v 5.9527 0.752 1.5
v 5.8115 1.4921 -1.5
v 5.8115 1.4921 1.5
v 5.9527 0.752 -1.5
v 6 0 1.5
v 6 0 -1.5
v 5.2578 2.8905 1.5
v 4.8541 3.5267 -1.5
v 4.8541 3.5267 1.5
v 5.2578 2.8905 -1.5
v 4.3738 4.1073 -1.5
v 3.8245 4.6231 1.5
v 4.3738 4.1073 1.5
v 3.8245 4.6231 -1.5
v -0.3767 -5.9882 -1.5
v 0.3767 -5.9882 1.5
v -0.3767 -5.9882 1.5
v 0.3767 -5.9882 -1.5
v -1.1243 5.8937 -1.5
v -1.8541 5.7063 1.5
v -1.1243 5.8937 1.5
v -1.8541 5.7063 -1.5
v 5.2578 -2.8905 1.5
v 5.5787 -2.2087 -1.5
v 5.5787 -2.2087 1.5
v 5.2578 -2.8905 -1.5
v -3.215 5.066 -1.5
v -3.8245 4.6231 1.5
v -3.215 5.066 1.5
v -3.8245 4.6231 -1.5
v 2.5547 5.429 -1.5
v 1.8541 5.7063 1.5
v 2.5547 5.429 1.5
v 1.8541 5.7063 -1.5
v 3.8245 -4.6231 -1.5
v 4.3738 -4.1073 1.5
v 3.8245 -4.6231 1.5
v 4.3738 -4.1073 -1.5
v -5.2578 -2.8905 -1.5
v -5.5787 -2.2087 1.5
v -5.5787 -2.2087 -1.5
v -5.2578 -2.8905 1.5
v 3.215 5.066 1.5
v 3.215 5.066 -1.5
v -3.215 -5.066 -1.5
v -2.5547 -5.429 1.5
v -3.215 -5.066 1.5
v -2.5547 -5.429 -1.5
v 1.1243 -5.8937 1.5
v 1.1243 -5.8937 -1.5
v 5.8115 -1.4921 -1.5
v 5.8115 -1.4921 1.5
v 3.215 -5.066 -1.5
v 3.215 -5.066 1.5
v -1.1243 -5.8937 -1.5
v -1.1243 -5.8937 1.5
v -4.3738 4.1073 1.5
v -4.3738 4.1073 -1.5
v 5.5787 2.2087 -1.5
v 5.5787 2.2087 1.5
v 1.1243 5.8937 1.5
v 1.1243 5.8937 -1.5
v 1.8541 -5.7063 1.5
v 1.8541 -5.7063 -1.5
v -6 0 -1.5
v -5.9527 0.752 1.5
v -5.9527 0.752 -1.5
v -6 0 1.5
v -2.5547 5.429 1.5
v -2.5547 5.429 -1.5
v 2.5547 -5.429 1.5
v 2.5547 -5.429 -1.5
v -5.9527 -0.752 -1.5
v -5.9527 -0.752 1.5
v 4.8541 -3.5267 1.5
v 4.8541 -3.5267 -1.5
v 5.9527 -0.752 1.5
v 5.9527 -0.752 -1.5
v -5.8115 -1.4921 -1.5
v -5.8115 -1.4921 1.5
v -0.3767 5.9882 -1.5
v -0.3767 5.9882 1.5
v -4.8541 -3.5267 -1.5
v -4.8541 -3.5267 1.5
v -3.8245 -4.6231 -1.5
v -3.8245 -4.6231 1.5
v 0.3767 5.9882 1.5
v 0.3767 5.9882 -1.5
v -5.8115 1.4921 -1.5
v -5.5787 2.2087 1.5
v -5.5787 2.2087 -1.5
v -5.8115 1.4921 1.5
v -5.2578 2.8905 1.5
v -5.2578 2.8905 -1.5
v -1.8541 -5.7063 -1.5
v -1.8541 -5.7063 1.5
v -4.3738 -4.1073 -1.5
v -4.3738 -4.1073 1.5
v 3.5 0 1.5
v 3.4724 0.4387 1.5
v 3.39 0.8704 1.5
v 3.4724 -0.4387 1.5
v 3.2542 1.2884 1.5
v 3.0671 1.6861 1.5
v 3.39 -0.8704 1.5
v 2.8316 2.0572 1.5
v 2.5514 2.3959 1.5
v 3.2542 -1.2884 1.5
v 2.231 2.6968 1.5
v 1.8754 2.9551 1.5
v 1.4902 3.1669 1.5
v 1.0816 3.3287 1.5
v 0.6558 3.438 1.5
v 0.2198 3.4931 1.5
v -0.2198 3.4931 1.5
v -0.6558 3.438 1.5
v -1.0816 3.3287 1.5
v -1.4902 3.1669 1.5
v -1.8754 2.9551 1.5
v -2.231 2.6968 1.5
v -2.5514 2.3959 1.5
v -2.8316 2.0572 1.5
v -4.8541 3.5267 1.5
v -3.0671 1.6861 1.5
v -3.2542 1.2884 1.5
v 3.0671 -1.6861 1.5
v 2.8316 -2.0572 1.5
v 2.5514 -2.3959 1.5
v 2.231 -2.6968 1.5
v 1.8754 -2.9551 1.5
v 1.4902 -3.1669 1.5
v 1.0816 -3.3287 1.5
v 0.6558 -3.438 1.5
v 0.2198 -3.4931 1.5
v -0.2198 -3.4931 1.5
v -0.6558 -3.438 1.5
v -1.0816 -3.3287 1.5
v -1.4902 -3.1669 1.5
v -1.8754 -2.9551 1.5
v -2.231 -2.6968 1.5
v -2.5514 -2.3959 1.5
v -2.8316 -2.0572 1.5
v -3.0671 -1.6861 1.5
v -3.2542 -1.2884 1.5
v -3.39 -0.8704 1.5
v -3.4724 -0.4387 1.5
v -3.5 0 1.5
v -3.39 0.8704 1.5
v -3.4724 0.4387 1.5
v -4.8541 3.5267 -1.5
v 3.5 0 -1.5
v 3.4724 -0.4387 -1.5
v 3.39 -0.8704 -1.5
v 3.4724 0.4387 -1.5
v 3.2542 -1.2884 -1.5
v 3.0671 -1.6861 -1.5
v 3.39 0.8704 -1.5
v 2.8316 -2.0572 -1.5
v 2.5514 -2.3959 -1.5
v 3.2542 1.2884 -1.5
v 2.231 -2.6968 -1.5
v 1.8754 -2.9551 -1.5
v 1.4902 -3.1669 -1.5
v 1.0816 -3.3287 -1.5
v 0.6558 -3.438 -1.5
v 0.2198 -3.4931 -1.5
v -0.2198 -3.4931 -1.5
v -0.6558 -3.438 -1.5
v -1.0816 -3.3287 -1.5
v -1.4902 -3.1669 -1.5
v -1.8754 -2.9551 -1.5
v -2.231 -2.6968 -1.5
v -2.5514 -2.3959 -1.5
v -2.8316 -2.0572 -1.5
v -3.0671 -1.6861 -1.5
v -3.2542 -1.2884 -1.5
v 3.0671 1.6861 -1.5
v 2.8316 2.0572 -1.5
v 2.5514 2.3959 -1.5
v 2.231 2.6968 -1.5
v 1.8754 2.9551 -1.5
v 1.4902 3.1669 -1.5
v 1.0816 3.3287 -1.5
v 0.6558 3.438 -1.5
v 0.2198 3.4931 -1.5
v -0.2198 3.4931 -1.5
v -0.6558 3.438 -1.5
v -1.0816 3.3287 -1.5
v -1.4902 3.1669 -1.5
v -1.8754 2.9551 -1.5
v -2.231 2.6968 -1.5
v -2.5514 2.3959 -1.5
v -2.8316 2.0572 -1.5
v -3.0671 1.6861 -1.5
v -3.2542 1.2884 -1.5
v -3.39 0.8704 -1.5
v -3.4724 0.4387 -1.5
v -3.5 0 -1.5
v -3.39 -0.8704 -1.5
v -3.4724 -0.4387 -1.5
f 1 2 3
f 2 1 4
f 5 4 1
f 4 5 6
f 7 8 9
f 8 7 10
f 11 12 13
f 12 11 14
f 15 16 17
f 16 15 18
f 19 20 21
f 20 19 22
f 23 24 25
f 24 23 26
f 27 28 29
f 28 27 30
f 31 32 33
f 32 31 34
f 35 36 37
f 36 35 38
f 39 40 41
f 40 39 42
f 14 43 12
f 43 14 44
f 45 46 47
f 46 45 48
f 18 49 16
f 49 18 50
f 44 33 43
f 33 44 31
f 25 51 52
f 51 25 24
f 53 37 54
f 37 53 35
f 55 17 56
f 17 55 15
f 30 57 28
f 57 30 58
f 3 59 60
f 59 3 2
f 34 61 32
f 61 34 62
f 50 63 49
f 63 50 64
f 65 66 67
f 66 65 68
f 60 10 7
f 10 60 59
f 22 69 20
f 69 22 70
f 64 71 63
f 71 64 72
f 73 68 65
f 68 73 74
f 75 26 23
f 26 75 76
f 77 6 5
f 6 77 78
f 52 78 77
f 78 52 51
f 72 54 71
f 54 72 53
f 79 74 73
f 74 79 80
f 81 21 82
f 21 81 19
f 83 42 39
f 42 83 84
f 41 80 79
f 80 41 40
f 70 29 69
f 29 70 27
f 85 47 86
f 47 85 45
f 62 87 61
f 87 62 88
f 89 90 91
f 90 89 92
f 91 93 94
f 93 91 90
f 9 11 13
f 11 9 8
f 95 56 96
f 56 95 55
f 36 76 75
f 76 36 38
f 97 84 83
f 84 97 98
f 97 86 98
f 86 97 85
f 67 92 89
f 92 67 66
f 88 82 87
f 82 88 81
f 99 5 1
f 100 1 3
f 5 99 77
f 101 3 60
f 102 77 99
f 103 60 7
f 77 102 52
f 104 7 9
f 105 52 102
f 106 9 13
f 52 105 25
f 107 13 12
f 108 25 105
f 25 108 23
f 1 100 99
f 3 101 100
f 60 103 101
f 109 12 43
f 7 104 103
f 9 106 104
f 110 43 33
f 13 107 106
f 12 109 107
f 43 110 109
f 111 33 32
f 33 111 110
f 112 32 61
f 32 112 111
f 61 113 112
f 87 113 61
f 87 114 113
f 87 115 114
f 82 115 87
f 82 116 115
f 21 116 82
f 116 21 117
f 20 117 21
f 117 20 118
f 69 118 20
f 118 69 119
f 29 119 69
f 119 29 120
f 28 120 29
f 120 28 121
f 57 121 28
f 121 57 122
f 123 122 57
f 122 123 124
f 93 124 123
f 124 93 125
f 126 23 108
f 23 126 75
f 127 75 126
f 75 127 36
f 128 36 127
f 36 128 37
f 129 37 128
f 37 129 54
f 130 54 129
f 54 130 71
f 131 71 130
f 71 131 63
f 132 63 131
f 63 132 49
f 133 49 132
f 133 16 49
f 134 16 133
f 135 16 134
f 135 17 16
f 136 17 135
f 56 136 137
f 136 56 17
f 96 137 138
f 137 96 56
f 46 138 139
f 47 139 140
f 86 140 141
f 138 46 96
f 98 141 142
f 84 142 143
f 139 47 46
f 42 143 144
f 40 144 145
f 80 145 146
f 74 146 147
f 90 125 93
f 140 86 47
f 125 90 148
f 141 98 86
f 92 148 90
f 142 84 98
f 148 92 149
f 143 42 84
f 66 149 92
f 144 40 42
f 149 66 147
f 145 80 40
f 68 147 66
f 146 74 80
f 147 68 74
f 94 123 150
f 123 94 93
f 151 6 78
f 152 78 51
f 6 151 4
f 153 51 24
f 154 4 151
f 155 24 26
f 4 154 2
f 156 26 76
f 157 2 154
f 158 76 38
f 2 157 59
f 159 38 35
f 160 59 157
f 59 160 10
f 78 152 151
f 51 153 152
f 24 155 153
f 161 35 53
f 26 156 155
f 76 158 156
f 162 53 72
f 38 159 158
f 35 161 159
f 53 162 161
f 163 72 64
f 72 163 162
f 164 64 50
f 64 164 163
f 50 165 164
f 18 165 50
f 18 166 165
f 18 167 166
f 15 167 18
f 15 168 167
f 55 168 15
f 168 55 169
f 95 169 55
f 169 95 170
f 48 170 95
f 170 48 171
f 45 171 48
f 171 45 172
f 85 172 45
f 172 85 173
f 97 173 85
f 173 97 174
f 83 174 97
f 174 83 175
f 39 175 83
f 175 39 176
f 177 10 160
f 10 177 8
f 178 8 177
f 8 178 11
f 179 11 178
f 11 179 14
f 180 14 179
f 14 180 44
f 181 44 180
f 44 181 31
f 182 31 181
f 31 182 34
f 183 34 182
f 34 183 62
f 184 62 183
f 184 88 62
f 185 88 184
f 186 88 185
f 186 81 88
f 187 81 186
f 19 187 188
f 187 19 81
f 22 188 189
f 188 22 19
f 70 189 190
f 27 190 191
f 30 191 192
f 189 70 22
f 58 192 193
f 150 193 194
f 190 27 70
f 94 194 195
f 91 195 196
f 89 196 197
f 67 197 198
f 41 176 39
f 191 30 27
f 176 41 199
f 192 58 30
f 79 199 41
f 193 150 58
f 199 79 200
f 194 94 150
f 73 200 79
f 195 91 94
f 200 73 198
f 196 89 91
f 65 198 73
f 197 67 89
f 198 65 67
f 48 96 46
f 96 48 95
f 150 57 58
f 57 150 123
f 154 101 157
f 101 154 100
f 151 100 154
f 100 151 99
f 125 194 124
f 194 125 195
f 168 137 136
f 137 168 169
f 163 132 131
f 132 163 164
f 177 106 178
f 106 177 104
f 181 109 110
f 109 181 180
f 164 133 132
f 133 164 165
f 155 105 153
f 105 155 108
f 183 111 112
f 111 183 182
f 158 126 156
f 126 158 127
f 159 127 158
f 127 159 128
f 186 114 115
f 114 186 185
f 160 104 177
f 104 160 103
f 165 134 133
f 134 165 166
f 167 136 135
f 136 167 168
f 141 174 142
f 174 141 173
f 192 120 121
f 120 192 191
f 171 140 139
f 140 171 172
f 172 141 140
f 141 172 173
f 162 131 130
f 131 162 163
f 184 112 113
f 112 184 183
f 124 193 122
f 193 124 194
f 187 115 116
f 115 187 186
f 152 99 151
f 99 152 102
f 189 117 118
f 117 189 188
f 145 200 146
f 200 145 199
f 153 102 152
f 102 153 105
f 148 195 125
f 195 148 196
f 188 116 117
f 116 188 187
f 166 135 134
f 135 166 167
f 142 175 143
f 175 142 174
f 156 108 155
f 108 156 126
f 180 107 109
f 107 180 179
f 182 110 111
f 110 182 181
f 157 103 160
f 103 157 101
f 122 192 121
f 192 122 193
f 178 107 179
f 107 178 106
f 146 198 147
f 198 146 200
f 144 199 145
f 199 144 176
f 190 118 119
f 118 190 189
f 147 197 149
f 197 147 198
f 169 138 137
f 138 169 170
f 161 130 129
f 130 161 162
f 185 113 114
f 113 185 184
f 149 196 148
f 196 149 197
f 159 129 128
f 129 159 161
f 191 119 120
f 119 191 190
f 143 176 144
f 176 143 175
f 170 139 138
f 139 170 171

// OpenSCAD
$fn = 50;


difference() {
	union() {
		translate(v = [0, 0, -1.5000000000]) {
			cylinder(h = 3, r = 6.0000000000);
		}
	}
	union() {
		translate(v = [0, 0, -100.0000000000]) {
			cylinder(h = 200, r = 3.5000000000);
		}
	}
}
